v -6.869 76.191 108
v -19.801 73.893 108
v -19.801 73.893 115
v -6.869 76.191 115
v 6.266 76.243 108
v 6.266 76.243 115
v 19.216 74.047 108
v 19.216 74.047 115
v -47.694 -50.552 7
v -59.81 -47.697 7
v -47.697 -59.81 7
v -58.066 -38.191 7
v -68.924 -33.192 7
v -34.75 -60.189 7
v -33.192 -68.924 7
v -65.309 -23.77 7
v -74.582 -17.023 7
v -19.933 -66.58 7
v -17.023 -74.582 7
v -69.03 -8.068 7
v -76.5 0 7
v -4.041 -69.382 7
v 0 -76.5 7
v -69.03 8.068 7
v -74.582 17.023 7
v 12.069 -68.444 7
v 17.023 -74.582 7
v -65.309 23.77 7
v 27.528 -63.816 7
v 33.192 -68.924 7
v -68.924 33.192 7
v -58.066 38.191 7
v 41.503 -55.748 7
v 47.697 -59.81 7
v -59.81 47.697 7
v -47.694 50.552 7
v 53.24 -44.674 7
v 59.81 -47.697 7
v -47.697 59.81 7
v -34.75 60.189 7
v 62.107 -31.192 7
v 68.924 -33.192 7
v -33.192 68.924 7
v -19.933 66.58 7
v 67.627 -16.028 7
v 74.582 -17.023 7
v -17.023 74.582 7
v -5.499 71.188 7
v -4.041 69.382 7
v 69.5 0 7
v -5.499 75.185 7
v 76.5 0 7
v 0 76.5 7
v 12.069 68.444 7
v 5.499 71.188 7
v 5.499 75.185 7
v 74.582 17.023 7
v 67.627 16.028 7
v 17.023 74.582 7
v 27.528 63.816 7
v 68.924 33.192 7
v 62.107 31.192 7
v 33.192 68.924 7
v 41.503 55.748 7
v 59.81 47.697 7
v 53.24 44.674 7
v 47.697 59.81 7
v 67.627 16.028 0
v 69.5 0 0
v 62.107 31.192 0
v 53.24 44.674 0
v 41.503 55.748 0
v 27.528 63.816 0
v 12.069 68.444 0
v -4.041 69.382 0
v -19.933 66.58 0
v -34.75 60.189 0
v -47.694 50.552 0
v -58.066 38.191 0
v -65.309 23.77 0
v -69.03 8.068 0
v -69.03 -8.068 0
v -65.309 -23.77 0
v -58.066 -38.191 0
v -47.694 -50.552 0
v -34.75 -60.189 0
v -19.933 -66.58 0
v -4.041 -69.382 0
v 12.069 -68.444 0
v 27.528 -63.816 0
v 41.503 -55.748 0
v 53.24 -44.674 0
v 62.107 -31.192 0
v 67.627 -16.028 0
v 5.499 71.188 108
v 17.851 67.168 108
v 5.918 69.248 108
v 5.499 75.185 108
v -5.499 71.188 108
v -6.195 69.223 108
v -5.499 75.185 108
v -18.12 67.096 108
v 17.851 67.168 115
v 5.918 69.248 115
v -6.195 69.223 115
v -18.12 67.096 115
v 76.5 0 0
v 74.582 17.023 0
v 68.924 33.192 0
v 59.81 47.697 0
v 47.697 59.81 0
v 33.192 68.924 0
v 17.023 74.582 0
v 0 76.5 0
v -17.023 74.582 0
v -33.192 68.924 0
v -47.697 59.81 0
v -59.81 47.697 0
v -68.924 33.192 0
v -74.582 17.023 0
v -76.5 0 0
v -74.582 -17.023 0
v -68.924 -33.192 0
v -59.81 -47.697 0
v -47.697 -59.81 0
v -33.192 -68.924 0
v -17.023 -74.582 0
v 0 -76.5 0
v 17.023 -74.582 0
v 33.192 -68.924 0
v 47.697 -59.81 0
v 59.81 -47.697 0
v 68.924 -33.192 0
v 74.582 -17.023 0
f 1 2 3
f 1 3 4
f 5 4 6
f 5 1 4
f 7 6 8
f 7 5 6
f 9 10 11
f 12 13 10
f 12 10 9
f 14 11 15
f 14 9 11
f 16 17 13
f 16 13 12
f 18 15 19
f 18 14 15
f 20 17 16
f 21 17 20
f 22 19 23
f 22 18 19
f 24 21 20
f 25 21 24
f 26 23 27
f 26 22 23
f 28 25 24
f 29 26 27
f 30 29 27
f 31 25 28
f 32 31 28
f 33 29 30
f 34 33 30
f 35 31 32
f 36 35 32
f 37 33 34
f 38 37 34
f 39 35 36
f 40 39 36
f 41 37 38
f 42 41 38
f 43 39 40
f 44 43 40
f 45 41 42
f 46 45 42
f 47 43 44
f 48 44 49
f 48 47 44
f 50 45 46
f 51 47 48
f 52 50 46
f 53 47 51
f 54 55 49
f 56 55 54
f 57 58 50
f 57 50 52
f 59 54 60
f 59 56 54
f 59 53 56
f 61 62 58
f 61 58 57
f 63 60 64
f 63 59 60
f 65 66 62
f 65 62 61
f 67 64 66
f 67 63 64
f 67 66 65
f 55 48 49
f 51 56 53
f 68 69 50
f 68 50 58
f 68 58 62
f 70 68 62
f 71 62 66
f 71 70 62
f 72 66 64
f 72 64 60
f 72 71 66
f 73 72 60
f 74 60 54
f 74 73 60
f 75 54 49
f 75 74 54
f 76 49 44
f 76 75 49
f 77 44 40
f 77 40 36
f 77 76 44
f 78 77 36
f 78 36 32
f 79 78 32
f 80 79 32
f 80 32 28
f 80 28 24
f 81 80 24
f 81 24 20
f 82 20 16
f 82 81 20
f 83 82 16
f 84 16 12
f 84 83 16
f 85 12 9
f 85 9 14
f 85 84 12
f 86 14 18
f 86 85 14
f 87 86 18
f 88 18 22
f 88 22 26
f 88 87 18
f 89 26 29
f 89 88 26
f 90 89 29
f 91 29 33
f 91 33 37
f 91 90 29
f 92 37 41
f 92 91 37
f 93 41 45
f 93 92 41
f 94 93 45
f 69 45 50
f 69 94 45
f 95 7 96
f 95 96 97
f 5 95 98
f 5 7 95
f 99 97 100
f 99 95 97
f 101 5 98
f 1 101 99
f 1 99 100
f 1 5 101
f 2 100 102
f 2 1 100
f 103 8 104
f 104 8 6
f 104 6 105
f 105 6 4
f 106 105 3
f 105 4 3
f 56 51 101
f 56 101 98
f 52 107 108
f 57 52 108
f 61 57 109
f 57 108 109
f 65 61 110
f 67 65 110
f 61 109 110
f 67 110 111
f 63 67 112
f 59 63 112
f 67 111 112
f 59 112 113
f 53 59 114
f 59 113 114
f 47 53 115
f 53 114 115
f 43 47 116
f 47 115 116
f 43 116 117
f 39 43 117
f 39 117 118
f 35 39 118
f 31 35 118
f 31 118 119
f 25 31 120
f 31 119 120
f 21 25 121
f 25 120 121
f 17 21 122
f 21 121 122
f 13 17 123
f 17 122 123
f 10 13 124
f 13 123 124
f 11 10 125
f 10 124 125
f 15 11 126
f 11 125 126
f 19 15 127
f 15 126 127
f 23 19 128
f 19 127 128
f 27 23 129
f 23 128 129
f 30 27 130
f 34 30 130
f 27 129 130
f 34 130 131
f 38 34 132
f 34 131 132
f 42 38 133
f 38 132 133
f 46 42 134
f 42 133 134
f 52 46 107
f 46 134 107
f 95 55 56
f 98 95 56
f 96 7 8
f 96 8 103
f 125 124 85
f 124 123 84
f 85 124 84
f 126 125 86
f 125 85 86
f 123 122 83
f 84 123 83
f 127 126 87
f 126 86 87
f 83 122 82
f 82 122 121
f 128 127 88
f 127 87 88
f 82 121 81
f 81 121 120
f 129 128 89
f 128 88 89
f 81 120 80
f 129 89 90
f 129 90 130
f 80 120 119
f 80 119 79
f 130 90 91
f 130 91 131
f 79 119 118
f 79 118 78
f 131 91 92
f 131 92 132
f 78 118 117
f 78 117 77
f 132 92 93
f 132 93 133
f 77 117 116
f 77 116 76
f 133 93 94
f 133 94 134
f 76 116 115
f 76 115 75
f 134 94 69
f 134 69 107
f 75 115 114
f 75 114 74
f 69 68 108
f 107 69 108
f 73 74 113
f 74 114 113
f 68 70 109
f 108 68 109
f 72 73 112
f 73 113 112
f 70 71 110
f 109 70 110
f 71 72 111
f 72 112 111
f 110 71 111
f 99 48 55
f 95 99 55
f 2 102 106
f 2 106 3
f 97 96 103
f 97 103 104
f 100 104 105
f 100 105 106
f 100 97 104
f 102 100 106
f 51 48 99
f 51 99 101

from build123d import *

# Parameters (mm, degrees)
SKETCH1_R           = 76.5
SKETCH1_R_2         = 69.5
BOSS_EXTRUDE1_DEPTH = 7
SKETCH2_W           = 10.998336412
SKETCH2_H           = 3.996279506
BOSS_EXTRUDE2_DEPTH = 101
BOSS_EXTRUDE3_DEPTH = 7


with BuildPart() as part:
    # Sketch1 → Boss-Extrude1 (new body)
    with BuildSketch(Plane.XY):
        Circle(SKETCH1_R)
        Circle(SKETCH1_R_2, mode=Mode.SUBTRACT)
    extrude(amount=BOSS_EXTRUDE1_DEPTH)

    # Sketch2 → Boss-Extrude2 (add)
    with BuildSketch(Plane.XY.offset(7)):
        with Locations((0, 73.186602974)):
            Rectangle(SKETCH2_W, SKETCH2_H)
    extrude(amount=BOSS_EXTRUDE2_DEPTH)

    # Sketch3 → Boss-Extrude3 (add)
    with BuildSketch(Plane.XY.offset(108)):
        with BuildLine():
            Line((-18.119939766, 67.096332112), (-19.801444594, 73.89284669))
            ThreePointArc((-19.801444594, 73.89284669), (-0.302678458, 76.499401212), (19.216103117, 74.047223993))
            Line((19.216103117, 74.047223993), (17.850832513, 67.168428436))
            ThreePointArc((17.850832513, 67.168428436), (-0.139298774, 69.499860402), (-18.119939766, 67.096332112))
        make_face()
    extrude(amount=BOSS_EXTRUDE3_DEPTH)


solid = part.part
